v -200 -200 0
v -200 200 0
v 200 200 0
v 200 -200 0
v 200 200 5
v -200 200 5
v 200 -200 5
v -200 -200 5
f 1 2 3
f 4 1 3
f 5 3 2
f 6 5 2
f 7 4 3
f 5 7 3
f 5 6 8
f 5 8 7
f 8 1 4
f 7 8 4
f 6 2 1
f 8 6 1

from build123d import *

# Parameters (mm, degrees)
F1_DEPTH = 5
F0_W     = 265
F0_H     = 130
F2_DEPTH = 5
F0_W_2   = 130
F3_DEPTH = 5


with BuildPart() as f1:
    # F0 (on Top) → F1 (new body)
    with BuildSketch(Plane.XY):
        Polygon((195, -70), (-200, -70), (-200, -200), (200, -200), (200, -70), align=None)
    extrude(amount=F1_DEPTH)

    # F0 (on Top) → F2 (join)
    with BuildSketch(Plane.XY):
        Polygon((-200, 60), (-200, 0), (-200, -70), (195, -70), (195, 60), (65, 60), align=None)
        with Locations((-67.5, 125)):
            Rectangle(F0_W, F0_H)
        Polygon((195, -70), (-200, -70), (-200, -200), (200, -200), (200, -70), align=None)
        Polygon((-200, 200), (-200, 190), (65, 190), (195, 190), (195, 60), (195, -70), (200, -70), (200, 200), align=None)
    extrude(amount=F2_DEPTH)

    # F0 (on Top) → F3 (join)
    with BuildSketch(Plane.XY):
        with Locations((130, 125)):
            Rectangle(F0_W_2, F0_H)
    extrude(amount=F3_DEPTH)


solid = f1.part
